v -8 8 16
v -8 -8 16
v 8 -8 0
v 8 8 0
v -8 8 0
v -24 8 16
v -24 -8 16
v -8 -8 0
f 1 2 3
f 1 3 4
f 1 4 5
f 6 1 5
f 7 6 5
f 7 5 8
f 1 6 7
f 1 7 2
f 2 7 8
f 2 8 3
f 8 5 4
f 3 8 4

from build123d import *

# Parameters (mm, degrees)
F1_DEPTH = 16
F2_SIZE  = 15.99999


# Not quite as in the source:
# - a fillet or chamfer is up to 0.001 mm smaller than in the source, because OpenCascade refuses the exact size


with BuildPart() as f1:
    # F0 (on Top) → F1 (new body)
    with BuildSketch(Plane.XY):
        Polygon((8, -8), (8, 8), (0, 8), (-8, 8), (-16, 8), (-24, 8), (-24, -8), (-16, -8), (-8, -8), (0, -8), align=None)
    extrude(amount=F1_DEPTH)

    # F2 (size 16 in the source; OpenCascade refuses exactly that, so slightly less here)
    f2_edges = [f1.edges().sort_by_distance(p)[0] for p in [
        (8, 0, 16),
        (-24, 0, 0),
    ]]
    chamfer(f2_edges, length=F2_SIZE)


solid = f1.part
